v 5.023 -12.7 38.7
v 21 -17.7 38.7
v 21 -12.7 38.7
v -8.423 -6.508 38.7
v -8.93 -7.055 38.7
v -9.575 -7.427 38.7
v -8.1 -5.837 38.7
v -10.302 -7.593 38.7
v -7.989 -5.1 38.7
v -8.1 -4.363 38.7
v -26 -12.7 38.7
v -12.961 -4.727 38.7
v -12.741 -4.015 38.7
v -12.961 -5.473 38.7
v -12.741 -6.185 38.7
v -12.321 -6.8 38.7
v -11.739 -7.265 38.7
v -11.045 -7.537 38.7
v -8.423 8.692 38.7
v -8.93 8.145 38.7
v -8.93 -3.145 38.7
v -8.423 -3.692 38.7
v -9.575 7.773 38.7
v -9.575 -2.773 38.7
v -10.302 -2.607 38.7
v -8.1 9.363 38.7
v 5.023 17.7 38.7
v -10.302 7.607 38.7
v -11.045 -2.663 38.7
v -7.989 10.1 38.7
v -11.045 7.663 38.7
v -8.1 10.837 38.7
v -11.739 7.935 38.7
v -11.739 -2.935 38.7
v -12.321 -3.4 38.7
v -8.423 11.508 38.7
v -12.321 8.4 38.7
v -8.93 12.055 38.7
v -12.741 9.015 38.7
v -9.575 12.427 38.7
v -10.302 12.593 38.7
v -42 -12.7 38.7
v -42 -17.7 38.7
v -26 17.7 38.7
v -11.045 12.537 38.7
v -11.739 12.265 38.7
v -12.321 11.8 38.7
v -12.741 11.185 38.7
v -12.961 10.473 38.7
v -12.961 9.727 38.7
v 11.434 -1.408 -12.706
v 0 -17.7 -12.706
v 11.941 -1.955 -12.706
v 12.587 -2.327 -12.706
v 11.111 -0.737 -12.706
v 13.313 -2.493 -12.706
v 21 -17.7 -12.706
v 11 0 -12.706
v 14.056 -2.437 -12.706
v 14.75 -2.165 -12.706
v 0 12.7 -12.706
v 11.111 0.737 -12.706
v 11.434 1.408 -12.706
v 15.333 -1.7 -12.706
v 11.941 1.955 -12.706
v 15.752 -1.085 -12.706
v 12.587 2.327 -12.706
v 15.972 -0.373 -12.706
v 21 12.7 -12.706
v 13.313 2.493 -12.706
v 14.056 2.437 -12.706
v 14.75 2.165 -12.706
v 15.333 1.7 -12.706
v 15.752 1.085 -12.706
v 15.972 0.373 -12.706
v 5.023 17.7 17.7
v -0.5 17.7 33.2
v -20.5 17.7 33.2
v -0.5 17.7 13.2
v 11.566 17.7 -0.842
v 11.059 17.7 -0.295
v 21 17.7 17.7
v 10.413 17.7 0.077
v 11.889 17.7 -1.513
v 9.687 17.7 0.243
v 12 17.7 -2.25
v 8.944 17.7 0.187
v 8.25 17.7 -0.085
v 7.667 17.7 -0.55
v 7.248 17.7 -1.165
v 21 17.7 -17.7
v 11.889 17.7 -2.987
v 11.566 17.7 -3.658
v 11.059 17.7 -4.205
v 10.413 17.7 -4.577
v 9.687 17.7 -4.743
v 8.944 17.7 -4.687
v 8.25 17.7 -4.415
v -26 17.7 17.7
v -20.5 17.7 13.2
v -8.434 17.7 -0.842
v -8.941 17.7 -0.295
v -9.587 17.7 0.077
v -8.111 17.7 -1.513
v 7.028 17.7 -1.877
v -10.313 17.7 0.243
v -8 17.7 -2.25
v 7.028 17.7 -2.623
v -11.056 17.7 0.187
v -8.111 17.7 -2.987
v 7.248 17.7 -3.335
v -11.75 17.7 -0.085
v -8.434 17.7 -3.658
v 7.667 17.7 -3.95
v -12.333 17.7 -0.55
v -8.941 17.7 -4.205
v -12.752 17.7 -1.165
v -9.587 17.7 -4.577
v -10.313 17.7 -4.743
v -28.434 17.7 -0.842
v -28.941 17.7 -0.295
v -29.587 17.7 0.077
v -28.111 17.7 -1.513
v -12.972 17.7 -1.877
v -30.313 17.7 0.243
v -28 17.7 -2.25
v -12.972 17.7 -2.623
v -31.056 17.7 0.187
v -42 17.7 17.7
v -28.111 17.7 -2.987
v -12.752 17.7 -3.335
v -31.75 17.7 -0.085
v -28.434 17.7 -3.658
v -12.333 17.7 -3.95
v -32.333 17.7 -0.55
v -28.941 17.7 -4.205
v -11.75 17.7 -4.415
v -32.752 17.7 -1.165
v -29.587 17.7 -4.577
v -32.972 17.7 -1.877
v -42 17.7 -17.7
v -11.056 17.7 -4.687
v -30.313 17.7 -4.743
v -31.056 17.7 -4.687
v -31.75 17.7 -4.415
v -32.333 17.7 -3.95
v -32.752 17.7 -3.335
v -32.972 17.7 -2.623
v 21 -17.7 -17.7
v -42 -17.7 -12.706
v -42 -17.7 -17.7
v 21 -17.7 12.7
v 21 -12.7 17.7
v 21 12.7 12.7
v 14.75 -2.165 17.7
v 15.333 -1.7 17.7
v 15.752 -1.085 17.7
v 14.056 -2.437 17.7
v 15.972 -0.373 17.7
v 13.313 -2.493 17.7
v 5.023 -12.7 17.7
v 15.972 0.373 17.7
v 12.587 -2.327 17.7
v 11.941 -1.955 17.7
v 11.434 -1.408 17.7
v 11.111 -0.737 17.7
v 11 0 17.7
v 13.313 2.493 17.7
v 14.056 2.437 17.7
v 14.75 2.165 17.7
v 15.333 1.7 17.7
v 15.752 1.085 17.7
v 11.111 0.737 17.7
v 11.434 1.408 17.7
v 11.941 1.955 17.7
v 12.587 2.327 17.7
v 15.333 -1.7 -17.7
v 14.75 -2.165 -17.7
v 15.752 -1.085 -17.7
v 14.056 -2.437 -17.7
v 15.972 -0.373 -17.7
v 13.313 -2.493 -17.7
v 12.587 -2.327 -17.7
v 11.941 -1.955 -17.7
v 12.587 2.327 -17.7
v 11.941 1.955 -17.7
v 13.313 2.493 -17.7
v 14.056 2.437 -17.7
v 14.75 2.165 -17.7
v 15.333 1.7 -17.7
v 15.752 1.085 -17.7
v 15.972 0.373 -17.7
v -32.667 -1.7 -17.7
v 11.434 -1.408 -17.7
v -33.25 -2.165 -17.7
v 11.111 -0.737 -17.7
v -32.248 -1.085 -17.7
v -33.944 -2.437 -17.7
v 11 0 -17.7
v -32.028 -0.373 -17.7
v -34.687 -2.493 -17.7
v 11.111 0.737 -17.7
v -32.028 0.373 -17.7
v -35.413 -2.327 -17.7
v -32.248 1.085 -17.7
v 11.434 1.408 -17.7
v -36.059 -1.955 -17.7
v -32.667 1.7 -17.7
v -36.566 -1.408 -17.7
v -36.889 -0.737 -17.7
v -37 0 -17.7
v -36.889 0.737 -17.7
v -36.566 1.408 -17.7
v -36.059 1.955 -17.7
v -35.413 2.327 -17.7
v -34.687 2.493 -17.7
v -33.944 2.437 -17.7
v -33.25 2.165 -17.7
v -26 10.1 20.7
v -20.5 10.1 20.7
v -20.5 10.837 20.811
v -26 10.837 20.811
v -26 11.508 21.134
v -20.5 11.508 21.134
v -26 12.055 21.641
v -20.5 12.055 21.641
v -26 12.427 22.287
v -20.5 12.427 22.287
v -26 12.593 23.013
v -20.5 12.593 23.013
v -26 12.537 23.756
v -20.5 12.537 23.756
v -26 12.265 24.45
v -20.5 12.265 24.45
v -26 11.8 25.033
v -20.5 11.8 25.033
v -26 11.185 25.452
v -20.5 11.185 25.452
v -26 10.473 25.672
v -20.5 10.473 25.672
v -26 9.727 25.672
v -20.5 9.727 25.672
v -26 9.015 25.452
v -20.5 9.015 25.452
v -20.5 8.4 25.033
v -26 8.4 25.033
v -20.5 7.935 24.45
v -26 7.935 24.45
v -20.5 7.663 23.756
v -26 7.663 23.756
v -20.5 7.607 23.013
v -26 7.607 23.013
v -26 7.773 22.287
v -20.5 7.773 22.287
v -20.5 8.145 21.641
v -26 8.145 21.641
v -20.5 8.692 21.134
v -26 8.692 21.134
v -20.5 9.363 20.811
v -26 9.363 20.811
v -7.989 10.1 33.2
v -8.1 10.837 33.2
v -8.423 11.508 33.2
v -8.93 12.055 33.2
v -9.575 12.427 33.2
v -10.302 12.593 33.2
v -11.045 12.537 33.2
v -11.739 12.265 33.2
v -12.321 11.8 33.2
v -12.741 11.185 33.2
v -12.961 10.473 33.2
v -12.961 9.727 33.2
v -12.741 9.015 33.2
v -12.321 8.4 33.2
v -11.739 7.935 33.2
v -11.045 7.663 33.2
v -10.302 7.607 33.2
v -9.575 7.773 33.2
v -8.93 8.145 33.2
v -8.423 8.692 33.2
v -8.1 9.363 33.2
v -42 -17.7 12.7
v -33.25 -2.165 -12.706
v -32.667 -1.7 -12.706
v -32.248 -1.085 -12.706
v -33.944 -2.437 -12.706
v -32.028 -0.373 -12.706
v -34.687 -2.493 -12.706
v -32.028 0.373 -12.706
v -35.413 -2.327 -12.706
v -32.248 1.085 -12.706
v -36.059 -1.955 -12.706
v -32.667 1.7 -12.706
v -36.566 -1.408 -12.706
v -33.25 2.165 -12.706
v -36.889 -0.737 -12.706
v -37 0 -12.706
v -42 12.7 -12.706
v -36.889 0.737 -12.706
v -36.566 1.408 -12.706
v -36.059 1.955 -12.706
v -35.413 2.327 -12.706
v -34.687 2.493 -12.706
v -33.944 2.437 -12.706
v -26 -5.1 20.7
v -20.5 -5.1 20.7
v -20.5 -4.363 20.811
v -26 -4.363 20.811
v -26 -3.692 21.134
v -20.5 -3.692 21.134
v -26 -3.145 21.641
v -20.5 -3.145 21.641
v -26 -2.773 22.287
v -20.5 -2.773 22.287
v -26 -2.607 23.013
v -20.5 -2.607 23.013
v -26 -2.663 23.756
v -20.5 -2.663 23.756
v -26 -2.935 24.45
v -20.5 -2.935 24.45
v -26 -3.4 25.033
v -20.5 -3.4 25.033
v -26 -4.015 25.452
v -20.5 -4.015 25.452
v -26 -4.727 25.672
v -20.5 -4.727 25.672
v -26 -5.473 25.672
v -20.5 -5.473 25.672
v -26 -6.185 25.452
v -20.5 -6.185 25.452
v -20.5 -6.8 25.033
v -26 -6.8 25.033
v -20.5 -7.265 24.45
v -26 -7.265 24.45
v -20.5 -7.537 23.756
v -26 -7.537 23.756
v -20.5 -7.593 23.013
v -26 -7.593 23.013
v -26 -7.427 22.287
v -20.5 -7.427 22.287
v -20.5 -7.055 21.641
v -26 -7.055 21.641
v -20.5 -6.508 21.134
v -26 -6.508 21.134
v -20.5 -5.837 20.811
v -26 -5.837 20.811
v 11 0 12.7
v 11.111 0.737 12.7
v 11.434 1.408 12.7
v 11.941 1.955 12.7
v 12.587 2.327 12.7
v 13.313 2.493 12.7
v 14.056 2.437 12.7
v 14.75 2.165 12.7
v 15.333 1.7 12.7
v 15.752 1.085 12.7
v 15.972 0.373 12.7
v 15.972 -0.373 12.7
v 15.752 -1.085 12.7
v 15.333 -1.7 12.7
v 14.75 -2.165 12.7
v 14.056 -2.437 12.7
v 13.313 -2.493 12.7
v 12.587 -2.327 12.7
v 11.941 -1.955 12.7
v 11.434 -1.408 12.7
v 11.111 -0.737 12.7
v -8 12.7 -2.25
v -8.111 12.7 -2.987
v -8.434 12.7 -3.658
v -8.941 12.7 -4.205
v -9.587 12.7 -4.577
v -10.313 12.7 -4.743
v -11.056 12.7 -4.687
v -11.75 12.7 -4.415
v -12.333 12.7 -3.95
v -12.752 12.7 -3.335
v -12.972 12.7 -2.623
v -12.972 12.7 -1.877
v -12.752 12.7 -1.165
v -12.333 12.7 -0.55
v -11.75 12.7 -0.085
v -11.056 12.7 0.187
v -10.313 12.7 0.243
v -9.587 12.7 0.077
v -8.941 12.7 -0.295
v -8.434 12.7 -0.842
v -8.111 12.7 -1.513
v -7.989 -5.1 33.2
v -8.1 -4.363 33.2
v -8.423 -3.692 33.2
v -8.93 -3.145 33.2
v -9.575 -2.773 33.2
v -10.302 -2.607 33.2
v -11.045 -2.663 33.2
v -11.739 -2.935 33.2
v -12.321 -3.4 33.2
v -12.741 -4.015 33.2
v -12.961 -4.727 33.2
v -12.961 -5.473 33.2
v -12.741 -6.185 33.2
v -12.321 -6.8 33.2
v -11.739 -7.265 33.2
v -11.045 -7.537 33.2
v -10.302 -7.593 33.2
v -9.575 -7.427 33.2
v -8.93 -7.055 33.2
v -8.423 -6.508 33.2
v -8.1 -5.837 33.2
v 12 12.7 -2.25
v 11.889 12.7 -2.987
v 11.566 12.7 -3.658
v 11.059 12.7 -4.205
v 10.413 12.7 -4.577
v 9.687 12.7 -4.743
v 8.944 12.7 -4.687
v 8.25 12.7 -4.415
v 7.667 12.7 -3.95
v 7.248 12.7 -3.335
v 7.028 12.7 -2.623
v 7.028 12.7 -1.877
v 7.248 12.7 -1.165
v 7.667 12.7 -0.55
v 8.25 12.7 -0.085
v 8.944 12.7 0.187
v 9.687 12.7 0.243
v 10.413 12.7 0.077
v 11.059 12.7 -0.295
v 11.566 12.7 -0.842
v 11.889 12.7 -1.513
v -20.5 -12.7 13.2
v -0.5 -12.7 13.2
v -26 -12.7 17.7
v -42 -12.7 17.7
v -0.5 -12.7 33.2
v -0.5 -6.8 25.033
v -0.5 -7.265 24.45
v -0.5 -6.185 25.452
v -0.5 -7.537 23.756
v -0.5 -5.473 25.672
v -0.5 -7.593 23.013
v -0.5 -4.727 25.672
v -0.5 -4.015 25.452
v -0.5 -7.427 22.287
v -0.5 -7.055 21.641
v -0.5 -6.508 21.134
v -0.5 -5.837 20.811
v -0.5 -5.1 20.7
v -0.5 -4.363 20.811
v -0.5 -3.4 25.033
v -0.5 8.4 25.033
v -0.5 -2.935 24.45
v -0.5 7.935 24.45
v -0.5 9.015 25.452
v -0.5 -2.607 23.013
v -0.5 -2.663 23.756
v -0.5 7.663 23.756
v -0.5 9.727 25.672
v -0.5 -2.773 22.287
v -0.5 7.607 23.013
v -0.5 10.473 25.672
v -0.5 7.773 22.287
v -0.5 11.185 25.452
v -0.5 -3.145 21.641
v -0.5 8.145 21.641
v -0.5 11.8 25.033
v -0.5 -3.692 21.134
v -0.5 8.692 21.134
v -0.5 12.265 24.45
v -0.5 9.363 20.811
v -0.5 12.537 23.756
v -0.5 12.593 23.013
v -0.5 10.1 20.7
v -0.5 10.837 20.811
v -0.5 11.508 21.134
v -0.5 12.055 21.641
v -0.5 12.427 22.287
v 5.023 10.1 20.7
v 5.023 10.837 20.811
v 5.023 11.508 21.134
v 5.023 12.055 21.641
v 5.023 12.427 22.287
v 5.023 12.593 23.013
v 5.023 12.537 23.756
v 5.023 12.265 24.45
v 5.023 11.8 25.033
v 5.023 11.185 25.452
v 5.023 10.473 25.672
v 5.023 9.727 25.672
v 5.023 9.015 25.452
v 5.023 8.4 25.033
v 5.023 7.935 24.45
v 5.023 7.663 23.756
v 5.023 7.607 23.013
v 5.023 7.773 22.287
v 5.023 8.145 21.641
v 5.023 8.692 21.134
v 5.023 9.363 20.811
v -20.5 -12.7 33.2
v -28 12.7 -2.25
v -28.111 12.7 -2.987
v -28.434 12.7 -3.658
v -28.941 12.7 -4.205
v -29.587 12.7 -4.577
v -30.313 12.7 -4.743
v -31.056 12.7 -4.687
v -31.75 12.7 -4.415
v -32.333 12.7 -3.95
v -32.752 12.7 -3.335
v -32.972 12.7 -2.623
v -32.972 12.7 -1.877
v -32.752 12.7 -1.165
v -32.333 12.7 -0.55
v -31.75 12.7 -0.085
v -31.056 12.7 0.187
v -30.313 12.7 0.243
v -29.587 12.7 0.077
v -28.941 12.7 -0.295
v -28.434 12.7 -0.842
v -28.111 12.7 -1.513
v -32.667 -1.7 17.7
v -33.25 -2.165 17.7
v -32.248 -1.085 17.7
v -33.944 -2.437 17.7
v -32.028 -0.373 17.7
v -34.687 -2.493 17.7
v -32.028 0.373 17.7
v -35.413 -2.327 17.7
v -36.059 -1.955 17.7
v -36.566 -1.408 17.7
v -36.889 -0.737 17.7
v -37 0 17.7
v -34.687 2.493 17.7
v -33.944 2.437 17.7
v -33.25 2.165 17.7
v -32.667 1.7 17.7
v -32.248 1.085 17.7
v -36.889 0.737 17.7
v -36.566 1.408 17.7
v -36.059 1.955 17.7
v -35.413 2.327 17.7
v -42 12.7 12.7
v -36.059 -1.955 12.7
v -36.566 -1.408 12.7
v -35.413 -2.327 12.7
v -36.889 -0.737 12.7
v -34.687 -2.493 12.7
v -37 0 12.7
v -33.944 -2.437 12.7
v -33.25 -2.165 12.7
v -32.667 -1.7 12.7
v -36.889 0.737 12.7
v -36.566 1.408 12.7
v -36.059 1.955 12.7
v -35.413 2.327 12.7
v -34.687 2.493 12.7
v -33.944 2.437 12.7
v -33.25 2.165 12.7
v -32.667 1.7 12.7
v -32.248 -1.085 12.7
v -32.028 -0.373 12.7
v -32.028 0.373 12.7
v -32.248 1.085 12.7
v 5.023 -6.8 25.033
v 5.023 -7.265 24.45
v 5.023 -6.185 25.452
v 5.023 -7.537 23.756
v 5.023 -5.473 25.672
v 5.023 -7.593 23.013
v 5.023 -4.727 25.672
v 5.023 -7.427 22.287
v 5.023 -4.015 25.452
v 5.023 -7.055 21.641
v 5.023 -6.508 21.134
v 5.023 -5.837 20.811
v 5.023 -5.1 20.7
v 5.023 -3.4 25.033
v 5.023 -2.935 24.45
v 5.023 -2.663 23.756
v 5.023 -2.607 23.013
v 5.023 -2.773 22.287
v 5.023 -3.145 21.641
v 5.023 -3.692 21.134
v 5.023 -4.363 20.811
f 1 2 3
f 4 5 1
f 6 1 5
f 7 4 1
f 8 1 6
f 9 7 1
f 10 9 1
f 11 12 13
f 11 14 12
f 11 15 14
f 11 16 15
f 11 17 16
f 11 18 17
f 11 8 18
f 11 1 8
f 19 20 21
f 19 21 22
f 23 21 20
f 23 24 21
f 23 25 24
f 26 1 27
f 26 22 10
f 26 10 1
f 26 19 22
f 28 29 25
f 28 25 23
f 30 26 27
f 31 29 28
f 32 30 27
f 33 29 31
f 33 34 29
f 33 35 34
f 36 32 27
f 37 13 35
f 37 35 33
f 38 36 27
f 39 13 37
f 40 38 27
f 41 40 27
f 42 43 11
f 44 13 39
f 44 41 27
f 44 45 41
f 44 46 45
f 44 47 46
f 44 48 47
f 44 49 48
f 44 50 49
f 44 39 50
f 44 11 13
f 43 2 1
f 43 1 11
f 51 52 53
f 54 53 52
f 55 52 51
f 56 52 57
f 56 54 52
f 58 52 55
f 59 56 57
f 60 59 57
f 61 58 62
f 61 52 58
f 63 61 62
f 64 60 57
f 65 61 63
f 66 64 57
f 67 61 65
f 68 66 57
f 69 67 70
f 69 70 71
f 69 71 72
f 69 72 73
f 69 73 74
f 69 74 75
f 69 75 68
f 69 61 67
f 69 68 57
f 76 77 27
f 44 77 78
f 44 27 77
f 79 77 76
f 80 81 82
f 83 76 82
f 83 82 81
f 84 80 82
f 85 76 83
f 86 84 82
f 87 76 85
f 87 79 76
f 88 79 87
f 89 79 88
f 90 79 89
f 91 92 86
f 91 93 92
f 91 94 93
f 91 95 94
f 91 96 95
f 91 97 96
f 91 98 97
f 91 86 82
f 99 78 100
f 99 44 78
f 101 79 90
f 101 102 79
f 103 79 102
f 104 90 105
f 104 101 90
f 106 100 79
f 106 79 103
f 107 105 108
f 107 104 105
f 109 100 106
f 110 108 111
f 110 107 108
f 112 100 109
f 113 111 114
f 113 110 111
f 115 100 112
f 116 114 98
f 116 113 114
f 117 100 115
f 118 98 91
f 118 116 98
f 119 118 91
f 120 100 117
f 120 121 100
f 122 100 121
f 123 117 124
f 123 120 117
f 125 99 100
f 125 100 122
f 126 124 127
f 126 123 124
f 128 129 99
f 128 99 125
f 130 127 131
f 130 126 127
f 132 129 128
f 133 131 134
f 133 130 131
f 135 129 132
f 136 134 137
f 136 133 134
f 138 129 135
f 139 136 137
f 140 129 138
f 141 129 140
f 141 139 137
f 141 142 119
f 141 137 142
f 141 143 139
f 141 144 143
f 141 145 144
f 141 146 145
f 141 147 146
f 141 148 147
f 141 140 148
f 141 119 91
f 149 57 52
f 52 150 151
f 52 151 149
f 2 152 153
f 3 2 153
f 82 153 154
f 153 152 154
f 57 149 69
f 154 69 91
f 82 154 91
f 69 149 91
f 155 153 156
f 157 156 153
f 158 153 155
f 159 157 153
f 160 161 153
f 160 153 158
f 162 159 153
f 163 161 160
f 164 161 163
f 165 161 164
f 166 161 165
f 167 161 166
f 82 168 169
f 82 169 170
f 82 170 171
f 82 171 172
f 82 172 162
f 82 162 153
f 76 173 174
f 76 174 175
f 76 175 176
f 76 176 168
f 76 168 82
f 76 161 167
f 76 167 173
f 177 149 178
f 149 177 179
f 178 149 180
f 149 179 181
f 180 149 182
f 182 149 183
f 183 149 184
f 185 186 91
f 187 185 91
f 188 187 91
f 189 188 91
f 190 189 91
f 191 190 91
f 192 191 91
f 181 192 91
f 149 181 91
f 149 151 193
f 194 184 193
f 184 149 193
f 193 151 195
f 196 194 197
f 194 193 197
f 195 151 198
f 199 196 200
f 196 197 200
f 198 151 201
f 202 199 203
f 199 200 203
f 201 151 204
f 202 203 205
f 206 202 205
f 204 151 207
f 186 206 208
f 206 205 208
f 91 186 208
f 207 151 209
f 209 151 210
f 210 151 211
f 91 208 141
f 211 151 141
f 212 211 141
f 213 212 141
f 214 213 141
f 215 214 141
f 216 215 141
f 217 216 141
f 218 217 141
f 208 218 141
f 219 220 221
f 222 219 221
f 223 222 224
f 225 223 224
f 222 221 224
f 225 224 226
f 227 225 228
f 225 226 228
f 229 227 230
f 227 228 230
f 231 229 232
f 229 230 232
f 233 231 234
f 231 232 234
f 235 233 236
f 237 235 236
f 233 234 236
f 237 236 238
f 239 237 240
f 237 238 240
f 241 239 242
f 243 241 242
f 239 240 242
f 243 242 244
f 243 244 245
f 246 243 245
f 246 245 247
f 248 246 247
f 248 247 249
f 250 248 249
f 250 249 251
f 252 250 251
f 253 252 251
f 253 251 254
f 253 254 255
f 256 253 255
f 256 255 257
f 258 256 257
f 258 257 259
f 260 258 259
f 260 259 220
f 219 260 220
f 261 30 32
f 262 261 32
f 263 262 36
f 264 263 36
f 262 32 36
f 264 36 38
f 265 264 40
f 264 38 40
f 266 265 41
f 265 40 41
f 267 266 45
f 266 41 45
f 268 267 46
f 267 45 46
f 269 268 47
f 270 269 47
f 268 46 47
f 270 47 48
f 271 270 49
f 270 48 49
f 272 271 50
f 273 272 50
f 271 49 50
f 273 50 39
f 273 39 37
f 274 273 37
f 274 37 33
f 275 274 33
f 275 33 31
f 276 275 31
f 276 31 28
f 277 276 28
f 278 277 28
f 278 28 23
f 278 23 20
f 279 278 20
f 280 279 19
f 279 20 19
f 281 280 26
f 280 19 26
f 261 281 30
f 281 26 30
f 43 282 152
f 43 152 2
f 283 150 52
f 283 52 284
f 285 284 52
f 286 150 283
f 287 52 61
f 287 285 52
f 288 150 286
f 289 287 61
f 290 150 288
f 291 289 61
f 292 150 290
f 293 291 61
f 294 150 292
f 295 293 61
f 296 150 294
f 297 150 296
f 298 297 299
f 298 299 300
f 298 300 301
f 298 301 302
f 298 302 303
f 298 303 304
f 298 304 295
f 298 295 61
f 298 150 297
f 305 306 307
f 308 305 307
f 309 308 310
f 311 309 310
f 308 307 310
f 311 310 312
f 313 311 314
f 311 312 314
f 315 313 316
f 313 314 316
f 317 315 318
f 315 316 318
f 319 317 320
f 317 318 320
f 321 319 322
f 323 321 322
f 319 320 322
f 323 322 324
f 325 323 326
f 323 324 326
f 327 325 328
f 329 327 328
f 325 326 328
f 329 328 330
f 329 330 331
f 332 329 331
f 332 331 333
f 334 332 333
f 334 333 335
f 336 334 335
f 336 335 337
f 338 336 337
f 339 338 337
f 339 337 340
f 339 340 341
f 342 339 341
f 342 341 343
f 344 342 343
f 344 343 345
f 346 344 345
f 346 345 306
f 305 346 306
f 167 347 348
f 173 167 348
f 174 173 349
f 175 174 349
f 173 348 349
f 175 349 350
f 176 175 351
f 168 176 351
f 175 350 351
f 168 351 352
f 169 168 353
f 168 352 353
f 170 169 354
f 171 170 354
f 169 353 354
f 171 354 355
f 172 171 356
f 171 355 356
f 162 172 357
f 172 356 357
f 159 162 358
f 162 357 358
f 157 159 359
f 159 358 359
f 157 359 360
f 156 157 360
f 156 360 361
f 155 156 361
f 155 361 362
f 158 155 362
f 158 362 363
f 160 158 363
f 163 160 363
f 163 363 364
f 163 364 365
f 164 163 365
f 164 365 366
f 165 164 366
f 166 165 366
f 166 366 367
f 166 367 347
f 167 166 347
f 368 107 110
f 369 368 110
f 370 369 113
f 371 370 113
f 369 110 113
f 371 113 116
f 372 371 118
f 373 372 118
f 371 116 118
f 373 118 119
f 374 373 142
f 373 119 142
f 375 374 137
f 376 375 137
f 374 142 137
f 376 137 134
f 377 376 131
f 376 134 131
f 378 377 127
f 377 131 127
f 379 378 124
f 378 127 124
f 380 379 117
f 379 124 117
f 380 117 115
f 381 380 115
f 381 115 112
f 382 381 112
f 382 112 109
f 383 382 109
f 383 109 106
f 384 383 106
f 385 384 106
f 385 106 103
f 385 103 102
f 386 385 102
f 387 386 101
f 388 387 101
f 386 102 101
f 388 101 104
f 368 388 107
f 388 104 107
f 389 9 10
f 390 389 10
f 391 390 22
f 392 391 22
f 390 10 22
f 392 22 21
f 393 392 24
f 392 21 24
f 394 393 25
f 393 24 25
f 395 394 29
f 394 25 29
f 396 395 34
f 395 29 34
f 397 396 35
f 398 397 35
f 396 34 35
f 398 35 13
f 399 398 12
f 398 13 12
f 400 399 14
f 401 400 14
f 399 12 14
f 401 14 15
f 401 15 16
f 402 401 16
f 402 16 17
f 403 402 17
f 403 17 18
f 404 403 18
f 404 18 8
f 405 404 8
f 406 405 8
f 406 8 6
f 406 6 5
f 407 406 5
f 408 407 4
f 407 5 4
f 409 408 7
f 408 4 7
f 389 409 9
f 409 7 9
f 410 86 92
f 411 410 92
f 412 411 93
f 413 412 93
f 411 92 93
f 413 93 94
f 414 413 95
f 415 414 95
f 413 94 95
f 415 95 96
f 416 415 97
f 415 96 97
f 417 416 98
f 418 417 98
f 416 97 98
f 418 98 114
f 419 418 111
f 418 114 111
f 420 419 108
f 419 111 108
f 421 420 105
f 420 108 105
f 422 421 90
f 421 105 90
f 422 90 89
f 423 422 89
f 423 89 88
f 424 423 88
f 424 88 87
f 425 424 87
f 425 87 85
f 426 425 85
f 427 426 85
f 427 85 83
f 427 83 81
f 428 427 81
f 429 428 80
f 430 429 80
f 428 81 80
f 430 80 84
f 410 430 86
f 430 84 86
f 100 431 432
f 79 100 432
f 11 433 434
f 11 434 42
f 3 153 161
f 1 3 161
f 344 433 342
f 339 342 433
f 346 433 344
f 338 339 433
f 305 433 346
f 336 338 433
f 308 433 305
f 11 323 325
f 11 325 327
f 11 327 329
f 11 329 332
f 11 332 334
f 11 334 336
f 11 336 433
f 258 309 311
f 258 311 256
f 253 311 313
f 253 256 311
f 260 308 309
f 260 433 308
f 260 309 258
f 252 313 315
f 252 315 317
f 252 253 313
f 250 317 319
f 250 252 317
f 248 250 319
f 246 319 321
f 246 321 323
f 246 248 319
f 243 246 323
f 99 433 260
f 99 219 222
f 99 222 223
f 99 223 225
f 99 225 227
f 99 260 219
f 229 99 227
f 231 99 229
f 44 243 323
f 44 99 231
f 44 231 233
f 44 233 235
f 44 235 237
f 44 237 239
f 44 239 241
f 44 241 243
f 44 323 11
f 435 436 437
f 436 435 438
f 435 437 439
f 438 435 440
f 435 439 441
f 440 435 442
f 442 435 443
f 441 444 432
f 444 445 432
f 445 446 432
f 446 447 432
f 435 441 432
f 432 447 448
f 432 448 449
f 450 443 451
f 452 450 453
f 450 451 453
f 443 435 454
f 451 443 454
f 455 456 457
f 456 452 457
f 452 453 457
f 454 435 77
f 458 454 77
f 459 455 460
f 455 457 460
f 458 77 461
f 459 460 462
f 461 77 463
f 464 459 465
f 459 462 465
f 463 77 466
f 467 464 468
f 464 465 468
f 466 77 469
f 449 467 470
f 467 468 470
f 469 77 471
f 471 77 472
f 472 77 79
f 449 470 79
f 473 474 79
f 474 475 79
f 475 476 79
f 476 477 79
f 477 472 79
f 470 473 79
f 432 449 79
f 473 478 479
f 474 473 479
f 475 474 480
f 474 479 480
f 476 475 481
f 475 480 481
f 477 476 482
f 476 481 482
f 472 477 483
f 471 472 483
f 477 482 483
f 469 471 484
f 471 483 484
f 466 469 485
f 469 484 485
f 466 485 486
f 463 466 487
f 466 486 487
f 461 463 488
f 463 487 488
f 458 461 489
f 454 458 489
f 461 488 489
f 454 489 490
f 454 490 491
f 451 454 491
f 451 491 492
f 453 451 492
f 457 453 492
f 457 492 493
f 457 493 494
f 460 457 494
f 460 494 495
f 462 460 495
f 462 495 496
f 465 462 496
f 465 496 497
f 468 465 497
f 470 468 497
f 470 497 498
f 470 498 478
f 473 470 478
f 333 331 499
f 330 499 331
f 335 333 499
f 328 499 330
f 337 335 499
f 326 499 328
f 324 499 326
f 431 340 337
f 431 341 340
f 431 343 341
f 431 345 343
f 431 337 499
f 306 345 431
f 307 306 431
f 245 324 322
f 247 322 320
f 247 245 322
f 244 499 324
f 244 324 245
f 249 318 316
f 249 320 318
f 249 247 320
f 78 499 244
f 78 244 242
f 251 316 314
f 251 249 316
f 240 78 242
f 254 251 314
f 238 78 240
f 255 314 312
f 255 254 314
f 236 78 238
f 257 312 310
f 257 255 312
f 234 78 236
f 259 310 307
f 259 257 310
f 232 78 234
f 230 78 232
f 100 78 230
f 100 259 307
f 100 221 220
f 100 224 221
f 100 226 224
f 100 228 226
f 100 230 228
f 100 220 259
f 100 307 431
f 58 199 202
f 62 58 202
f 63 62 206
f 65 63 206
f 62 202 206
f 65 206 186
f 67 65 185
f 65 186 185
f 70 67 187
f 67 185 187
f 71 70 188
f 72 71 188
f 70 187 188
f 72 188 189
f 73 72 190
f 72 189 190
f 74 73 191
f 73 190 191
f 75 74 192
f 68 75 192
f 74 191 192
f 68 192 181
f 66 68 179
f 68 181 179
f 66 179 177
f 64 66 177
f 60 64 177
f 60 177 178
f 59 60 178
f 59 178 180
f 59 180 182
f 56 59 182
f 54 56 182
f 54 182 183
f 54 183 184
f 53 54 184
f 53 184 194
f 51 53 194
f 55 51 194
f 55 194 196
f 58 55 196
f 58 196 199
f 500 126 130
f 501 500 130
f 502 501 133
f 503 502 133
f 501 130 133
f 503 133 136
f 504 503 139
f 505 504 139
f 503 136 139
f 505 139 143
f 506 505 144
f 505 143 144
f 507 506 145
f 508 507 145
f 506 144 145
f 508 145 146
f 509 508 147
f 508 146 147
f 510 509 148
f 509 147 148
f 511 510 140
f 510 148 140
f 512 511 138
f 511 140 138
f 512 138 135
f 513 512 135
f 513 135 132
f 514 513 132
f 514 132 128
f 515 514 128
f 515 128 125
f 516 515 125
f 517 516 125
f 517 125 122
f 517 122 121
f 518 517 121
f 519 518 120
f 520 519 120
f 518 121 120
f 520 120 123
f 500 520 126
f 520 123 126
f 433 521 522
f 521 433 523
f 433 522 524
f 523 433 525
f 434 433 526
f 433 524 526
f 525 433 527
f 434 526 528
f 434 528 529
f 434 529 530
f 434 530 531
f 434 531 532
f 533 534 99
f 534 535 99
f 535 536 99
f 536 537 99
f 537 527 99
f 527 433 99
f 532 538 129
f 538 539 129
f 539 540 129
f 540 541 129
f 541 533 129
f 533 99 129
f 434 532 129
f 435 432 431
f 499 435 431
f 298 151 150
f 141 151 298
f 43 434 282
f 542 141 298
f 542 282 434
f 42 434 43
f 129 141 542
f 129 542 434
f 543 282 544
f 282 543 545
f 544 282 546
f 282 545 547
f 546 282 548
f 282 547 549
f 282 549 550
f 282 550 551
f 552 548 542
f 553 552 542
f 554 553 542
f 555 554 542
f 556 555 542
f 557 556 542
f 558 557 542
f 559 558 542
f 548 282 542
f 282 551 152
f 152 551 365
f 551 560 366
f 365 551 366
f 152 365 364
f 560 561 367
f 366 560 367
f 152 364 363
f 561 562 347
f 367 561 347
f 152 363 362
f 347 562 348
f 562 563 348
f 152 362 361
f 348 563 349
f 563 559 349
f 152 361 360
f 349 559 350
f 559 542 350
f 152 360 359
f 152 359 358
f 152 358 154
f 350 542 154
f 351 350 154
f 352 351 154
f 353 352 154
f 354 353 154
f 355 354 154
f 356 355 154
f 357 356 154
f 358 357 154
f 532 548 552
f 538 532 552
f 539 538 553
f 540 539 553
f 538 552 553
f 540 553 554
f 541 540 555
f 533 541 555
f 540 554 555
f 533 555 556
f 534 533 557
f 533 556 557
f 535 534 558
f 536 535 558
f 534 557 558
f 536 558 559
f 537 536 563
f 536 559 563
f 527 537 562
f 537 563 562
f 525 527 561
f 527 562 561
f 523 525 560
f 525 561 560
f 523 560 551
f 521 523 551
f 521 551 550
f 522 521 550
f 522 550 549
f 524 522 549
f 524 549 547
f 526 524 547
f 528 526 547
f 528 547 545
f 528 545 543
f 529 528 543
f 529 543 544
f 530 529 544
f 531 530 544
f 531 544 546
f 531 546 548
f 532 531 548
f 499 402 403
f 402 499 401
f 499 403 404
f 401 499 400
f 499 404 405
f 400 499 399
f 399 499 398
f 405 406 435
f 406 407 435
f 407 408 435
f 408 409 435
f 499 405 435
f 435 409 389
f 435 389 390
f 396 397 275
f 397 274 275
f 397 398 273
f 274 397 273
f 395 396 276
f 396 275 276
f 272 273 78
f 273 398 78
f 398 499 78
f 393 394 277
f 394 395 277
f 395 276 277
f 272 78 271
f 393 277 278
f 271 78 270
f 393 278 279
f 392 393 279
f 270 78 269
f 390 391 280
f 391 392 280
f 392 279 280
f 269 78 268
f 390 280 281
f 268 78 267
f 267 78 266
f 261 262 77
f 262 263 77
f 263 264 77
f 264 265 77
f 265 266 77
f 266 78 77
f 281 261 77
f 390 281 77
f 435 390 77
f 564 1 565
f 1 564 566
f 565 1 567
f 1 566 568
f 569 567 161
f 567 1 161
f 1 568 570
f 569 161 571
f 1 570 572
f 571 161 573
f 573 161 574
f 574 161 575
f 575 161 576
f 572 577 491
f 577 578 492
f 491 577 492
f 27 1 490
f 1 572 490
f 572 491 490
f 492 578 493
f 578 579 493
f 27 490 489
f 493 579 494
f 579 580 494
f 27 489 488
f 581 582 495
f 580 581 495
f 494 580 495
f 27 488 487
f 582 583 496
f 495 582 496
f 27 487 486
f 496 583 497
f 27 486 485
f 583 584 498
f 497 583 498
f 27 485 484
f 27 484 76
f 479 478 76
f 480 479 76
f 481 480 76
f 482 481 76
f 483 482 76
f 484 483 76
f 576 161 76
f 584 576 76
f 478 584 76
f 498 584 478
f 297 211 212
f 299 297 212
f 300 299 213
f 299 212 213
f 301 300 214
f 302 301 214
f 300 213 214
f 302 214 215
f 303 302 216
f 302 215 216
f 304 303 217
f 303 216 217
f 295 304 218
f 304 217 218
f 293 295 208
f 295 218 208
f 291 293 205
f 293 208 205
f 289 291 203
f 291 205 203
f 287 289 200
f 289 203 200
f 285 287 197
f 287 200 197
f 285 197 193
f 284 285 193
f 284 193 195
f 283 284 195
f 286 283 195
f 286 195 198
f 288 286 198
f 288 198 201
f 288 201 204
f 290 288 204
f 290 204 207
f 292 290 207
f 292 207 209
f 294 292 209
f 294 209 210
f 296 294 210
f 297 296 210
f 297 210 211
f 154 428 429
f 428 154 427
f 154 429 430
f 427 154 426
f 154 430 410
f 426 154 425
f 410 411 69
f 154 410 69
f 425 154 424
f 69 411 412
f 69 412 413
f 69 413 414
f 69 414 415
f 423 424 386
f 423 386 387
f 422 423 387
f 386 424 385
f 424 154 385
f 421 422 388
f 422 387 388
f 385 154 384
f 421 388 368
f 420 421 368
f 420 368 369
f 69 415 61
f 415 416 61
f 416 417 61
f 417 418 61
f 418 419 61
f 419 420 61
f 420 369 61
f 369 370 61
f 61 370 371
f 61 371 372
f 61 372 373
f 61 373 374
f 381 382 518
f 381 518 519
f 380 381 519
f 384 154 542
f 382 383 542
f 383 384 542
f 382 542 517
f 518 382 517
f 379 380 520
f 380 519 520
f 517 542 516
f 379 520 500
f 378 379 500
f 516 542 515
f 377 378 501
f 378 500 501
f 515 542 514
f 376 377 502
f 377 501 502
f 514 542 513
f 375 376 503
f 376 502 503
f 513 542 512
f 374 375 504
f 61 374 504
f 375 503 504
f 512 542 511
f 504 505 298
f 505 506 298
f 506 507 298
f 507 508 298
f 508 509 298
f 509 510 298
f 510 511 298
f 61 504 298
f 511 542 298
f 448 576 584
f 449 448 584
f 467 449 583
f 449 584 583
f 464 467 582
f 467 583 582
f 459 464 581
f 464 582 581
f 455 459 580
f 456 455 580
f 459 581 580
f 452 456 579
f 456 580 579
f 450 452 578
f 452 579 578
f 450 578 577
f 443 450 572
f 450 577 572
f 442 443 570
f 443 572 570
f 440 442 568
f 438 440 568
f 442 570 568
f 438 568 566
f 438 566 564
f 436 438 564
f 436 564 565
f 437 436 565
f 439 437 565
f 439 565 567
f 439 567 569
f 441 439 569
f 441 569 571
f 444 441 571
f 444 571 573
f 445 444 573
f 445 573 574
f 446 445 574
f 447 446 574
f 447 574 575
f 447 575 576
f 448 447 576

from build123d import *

# Parameters (mm, degrees)
BOSS_EXTRUDE1_DEPTH  = 21
SKETCH4_W            = 42
SKETCH4_H            = 5
BOSS_EXTRUDE2_DEPTH  = 21
SKETCH5_W            = 21
SKETCH5_H            = 5
BOSS_EXTRUDE3_DEPTH  = 5
SKETCH7_W            = 5.022630365
SKETCH7_H            = 30.4
BOSS_EXTRUDE4_DEPTH  = 21
SKETCH8_W            = 26
SKETCH8_H            = 35.4
BOSS_EXTRUDE5_DEPTH  = 5
SKETCH9_W            = 26
SKETCH9_H            = 5
BOSS_EXTRUDE6_DEPTH  = 16
SKETCH10_W           = 16
SKETCH10_H           = 30.4
BOSS_EXTRUDE7_DEPTH  = 5
SKETCH11_W           = 21
SKETCH11_H           = 5
BOSS_EXTRUDE9_DEPTH  = 30.4
SKETCH13_W           = 21
SKETCH13_H           = 4.993745126
BOSS_EXTRUDE10_DEPTH = 30.4
SKETCH15_W           = 30.4
SKETCH15_H           = 5
BOSS_EXTRUDE11_DEPTH = 21
SKETCH18_W           = 5
SKETCH18_H           = 30.4
BOSS_EXTRUDE12_DEPTH = 21
SKETCH19_W           = 4.993745126
SKETCH19_H           = 30.4
BOSS_EXTRUDE13_DEPTH = 21
SKETCH21_W           = 21
SKETCH21_H           = 21
SKETCH21_W_2         = 20
SKETCH21_H_2         = 20
BOSS_EXTRUDE19_DEPTH = 30.4
SKETCH22_R           = 2.5
CUT_EXTRUDE1_DEPTH   = 47.02263
SKETCH24_R           = 2.5
CUT_EXTRUDE2_DEPTH   = 5.5
SKETCH25_R           = 2.5
CUT_EXTRUDE3_DEPTH   = 5
SKETCH26_R           = 2.5
CUT_EXTRUDE4_DEPTH   = 57.4
SKETCH28_W           = 21
SKETCH28_H           = 30.4
CUT_EXTRUDE5_DEPTH   = 0.006255


with BuildPart() as part:
    # Sketch2 → Boss-Extrude1 (new body)
    with BuildSketch(Plane(origin=(0, 0, 0), x_dir=(0, 0, -1), z_dir=(1, 0, 0))):
        Polygon((-17.7, 17.7), (17.7, 17.7), (17.7, -17.7), (12.7, -17.7), (12.7, -12.7), (12.7, 12.7), (-12.7, 12.7), (-12.7, -12.7), (-12.7, -17.7), (-17.7, -17.7), align=None)
    extrude(amount=BOSS_EXTRUDE1_DEPTH)

    # Sketch4 → Boss-Extrude2 (add)
    with BuildSketch(Plane.XY.offset(17.7)):
        with Locations((0, -15.2)):
            Rectangle(SKETCH4_W, SKETCH4_H)
    extrude(amount=BOSS_EXTRUDE2_DEPTH)

    # Sketch5 → Boss-Extrude3 (add)
    with BuildSketch(Plane(origin=(0, 0, 17.7), x_dir=(-1, 0, 0), z_dir=(0, 0, -1))):
        with Locations((10.5, -15.2)):
            Rectangle(SKETCH5_W, SKETCH5_H)
    extrude(amount=BOSS_EXTRUDE3_DEPTH)

    # Sketch7 → Boss-Extrude4 (add)
    with BuildSketch(Plane.XY.offset(17.7)):
        with Locations((2.511315183, 2.5)):
            Rectangle(SKETCH7_W, SKETCH7_H)
    extrude(amount=BOSS_EXTRUDE4_DEPTH)

    # Sketch8 → Boss-Extrude5 (add)
    with BuildSketch(Plane.ZY.offset(21)):
        with Locations((25.7, 0)):
            Rectangle(SKETCH8_W, SKETCH8_H)
    extrude(amount=BOSS_EXTRUDE5_DEPTH)

    # Sketch9 → Boss-Extrude6 (add)
    with BuildSketch(Plane.ZY.offset(26)):
        with Locations((25.7, -15.2)):
            Rectangle(SKETCH9_W, SKETCH9_H)
    extrude(amount=BOSS_EXTRUDE6_DEPTH)

    # Sketch10 → Boss-Extrude7 (add)
    with BuildSketch(Plane(origin=(0, 0, 12.7), x_dir=(-1, 0, 0), z_dir=(0, 0, -1))):
        with Locations((34, 2.5)):
            Rectangle(SKETCH10_W, SKETCH10_H)
    extrude(amount=-BOSS_EXTRUDE7_DEPTH)

    # Sketch11 → Boss-Extrude9 (add)
    with BuildSketch(Plane(origin=(0, 0, 12.7), x_dir=(-1, 0, 0), z_dir=(0, 0, -1))):
        with Locations((31.5, 15.2)):
            Rectangle(SKETCH11_W, SKETCH11_H)
    extrude(amount=BOSS_EXTRUDE9_DEPTH)

    # Sketch13 → Boss-Extrude10 (add)
    with BuildSketch(Plane.XZ.offset(-12.7)):
        with Locations((-31.5, -15.203127437)):
            Rectangle(SKETCH13_W, SKETCH13_H)
    extrude(amount=BOSS_EXTRUDE10_DEPTH)

    # Sketch15 → Boss-Extrude11 (add)
    with BuildSketch(Plane(origin=(-21, 0, 0), x_dir=(0, 0, -1), z_dir=(1, 0, 0))):
        with Locations((2.5, 15.2)):
            Rectangle(SKETCH15_W, SKETCH15_H)
    extrude(amount=BOSS_EXTRUDE11_DEPTH)

    # Sketch18 → Boss-Extrude12 (add)
    with BuildSketch(Plane(origin=(-21, 0, 0), x_dir=(0, 0, -1), z_dir=(1, 0, 0))):
        with Locations((-36.2, 2.5)):
            Rectangle(SKETCH18_W, SKETCH18_H)
    extrude(amount=BOSS_EXTRUDE12_DEPTH)

    # Sketch19 → Boss-Extrude13 (add)
    with BuildSketch(Plane(origin=(-21, 0, 0), x_dir=(0, 0, -1), z_dir=(1, 0, 0))):
        with Locations((15.203127437, -2.5)):
            Rectangle(SKETCH19_W, SKETCH19_H)
    extrude(amount=BOSS_EXTRUDE13_DEPTH)

    # Sketch21 → Boss-Extrude19 (add)
    with BuildSketch(Plane(origin=(0, 17.7, 0), x_dir=(1, 0, 0), z_dir=(0, 1, 0))):
        with Locations((-10.5, -23.2)):
            Rectangle(SKETCH21_W, SKETCH21_H)
        with Locations((-10.5, -23.2)):
            Rectangle(SKETCH21_W_2, SKETCH21_H_2, mode=Mode.SUBTRACT)
    extrude(amount=-BOSS_EXTRUDE19_DEPTH)

    # Sketch22 → Cut-Extrude1 (cut)
    with BuildSketch(Plane(origin=(5.022630365, 0, 0), x_dir=(0, 0, -1), z_dir=(1, 0, 0))):
        with Locations((-23.2, 10.1)):
            Circle(SKETCH22_R)
        with Locations((-23.2, -5.1)):
            Circle(SKETCH22_R)
    extrude(amount=-CUT_EXTRUDE1_DEPTH, mode=Mode.SUBTRACT)

    # Sketch24 → Cut-Extrude2 (cut)
    with BuildSketch(Plane.XY.offset(38.7)):
        with Locations((-10.488684817, 10.1)):
            Circle(SKETCH24_R)
        with Locations((-10.488684817, -5.1)):
            Circle(SKETCH24_R)
    extrude(amount=-CUT_EXTRUDE2_DEPTH, mode=Mode.SUBTRACT)

    # Sketch25 → Cut-Extrude3 (cut)
    with BuildSketch(Plane(origin=(0, 17.7, 0), x_dir=(1, 0, 0), z_dir=(0, 1, 0))):
        with Locations((-10.5, 2.25)):
            Circle(SKETCH25_R)
        with Locations((9.5, 2.25)):
            Circle(SKETCH25_R)
        with Locations((-30.5, 2.25)):
            Circle(SKETCH25_R)
    extrude(amount=-CUT_EXTRUDE3_DEPTH, mode=Mode.SUBTRACT)

    # Sketch26 → Cut-Extrude4 (cut, through all)
    with BuildSketch(Plane(origin=(0, 0, -17.7), x_dir=(-1, 0, 0), z_dir=(0, 0, -1))):
        with Locations((-13.5, 0)):
            Circle(SKETCH26_R)
        with Locations((34.5, 0)):
            Circle(SKETCH26_R)
    extrude(amount=-CUT_EXTRUDE4_DEPTH, mode=Mode.SUBTRACT)

    # Sketch28 → Cut-Extrude5 (cut)
    with BuildSketch(Plane.XY.offset(-12.7)):
        with Locations((10.5, -2.5)):
            Rectangle(SKETCH28_W, SKETCH28_H)
    extrude(amount=-CUT_EXTRUDE5_DEPTH, mode=Mode.SUBTRACT)


solid = part.part
